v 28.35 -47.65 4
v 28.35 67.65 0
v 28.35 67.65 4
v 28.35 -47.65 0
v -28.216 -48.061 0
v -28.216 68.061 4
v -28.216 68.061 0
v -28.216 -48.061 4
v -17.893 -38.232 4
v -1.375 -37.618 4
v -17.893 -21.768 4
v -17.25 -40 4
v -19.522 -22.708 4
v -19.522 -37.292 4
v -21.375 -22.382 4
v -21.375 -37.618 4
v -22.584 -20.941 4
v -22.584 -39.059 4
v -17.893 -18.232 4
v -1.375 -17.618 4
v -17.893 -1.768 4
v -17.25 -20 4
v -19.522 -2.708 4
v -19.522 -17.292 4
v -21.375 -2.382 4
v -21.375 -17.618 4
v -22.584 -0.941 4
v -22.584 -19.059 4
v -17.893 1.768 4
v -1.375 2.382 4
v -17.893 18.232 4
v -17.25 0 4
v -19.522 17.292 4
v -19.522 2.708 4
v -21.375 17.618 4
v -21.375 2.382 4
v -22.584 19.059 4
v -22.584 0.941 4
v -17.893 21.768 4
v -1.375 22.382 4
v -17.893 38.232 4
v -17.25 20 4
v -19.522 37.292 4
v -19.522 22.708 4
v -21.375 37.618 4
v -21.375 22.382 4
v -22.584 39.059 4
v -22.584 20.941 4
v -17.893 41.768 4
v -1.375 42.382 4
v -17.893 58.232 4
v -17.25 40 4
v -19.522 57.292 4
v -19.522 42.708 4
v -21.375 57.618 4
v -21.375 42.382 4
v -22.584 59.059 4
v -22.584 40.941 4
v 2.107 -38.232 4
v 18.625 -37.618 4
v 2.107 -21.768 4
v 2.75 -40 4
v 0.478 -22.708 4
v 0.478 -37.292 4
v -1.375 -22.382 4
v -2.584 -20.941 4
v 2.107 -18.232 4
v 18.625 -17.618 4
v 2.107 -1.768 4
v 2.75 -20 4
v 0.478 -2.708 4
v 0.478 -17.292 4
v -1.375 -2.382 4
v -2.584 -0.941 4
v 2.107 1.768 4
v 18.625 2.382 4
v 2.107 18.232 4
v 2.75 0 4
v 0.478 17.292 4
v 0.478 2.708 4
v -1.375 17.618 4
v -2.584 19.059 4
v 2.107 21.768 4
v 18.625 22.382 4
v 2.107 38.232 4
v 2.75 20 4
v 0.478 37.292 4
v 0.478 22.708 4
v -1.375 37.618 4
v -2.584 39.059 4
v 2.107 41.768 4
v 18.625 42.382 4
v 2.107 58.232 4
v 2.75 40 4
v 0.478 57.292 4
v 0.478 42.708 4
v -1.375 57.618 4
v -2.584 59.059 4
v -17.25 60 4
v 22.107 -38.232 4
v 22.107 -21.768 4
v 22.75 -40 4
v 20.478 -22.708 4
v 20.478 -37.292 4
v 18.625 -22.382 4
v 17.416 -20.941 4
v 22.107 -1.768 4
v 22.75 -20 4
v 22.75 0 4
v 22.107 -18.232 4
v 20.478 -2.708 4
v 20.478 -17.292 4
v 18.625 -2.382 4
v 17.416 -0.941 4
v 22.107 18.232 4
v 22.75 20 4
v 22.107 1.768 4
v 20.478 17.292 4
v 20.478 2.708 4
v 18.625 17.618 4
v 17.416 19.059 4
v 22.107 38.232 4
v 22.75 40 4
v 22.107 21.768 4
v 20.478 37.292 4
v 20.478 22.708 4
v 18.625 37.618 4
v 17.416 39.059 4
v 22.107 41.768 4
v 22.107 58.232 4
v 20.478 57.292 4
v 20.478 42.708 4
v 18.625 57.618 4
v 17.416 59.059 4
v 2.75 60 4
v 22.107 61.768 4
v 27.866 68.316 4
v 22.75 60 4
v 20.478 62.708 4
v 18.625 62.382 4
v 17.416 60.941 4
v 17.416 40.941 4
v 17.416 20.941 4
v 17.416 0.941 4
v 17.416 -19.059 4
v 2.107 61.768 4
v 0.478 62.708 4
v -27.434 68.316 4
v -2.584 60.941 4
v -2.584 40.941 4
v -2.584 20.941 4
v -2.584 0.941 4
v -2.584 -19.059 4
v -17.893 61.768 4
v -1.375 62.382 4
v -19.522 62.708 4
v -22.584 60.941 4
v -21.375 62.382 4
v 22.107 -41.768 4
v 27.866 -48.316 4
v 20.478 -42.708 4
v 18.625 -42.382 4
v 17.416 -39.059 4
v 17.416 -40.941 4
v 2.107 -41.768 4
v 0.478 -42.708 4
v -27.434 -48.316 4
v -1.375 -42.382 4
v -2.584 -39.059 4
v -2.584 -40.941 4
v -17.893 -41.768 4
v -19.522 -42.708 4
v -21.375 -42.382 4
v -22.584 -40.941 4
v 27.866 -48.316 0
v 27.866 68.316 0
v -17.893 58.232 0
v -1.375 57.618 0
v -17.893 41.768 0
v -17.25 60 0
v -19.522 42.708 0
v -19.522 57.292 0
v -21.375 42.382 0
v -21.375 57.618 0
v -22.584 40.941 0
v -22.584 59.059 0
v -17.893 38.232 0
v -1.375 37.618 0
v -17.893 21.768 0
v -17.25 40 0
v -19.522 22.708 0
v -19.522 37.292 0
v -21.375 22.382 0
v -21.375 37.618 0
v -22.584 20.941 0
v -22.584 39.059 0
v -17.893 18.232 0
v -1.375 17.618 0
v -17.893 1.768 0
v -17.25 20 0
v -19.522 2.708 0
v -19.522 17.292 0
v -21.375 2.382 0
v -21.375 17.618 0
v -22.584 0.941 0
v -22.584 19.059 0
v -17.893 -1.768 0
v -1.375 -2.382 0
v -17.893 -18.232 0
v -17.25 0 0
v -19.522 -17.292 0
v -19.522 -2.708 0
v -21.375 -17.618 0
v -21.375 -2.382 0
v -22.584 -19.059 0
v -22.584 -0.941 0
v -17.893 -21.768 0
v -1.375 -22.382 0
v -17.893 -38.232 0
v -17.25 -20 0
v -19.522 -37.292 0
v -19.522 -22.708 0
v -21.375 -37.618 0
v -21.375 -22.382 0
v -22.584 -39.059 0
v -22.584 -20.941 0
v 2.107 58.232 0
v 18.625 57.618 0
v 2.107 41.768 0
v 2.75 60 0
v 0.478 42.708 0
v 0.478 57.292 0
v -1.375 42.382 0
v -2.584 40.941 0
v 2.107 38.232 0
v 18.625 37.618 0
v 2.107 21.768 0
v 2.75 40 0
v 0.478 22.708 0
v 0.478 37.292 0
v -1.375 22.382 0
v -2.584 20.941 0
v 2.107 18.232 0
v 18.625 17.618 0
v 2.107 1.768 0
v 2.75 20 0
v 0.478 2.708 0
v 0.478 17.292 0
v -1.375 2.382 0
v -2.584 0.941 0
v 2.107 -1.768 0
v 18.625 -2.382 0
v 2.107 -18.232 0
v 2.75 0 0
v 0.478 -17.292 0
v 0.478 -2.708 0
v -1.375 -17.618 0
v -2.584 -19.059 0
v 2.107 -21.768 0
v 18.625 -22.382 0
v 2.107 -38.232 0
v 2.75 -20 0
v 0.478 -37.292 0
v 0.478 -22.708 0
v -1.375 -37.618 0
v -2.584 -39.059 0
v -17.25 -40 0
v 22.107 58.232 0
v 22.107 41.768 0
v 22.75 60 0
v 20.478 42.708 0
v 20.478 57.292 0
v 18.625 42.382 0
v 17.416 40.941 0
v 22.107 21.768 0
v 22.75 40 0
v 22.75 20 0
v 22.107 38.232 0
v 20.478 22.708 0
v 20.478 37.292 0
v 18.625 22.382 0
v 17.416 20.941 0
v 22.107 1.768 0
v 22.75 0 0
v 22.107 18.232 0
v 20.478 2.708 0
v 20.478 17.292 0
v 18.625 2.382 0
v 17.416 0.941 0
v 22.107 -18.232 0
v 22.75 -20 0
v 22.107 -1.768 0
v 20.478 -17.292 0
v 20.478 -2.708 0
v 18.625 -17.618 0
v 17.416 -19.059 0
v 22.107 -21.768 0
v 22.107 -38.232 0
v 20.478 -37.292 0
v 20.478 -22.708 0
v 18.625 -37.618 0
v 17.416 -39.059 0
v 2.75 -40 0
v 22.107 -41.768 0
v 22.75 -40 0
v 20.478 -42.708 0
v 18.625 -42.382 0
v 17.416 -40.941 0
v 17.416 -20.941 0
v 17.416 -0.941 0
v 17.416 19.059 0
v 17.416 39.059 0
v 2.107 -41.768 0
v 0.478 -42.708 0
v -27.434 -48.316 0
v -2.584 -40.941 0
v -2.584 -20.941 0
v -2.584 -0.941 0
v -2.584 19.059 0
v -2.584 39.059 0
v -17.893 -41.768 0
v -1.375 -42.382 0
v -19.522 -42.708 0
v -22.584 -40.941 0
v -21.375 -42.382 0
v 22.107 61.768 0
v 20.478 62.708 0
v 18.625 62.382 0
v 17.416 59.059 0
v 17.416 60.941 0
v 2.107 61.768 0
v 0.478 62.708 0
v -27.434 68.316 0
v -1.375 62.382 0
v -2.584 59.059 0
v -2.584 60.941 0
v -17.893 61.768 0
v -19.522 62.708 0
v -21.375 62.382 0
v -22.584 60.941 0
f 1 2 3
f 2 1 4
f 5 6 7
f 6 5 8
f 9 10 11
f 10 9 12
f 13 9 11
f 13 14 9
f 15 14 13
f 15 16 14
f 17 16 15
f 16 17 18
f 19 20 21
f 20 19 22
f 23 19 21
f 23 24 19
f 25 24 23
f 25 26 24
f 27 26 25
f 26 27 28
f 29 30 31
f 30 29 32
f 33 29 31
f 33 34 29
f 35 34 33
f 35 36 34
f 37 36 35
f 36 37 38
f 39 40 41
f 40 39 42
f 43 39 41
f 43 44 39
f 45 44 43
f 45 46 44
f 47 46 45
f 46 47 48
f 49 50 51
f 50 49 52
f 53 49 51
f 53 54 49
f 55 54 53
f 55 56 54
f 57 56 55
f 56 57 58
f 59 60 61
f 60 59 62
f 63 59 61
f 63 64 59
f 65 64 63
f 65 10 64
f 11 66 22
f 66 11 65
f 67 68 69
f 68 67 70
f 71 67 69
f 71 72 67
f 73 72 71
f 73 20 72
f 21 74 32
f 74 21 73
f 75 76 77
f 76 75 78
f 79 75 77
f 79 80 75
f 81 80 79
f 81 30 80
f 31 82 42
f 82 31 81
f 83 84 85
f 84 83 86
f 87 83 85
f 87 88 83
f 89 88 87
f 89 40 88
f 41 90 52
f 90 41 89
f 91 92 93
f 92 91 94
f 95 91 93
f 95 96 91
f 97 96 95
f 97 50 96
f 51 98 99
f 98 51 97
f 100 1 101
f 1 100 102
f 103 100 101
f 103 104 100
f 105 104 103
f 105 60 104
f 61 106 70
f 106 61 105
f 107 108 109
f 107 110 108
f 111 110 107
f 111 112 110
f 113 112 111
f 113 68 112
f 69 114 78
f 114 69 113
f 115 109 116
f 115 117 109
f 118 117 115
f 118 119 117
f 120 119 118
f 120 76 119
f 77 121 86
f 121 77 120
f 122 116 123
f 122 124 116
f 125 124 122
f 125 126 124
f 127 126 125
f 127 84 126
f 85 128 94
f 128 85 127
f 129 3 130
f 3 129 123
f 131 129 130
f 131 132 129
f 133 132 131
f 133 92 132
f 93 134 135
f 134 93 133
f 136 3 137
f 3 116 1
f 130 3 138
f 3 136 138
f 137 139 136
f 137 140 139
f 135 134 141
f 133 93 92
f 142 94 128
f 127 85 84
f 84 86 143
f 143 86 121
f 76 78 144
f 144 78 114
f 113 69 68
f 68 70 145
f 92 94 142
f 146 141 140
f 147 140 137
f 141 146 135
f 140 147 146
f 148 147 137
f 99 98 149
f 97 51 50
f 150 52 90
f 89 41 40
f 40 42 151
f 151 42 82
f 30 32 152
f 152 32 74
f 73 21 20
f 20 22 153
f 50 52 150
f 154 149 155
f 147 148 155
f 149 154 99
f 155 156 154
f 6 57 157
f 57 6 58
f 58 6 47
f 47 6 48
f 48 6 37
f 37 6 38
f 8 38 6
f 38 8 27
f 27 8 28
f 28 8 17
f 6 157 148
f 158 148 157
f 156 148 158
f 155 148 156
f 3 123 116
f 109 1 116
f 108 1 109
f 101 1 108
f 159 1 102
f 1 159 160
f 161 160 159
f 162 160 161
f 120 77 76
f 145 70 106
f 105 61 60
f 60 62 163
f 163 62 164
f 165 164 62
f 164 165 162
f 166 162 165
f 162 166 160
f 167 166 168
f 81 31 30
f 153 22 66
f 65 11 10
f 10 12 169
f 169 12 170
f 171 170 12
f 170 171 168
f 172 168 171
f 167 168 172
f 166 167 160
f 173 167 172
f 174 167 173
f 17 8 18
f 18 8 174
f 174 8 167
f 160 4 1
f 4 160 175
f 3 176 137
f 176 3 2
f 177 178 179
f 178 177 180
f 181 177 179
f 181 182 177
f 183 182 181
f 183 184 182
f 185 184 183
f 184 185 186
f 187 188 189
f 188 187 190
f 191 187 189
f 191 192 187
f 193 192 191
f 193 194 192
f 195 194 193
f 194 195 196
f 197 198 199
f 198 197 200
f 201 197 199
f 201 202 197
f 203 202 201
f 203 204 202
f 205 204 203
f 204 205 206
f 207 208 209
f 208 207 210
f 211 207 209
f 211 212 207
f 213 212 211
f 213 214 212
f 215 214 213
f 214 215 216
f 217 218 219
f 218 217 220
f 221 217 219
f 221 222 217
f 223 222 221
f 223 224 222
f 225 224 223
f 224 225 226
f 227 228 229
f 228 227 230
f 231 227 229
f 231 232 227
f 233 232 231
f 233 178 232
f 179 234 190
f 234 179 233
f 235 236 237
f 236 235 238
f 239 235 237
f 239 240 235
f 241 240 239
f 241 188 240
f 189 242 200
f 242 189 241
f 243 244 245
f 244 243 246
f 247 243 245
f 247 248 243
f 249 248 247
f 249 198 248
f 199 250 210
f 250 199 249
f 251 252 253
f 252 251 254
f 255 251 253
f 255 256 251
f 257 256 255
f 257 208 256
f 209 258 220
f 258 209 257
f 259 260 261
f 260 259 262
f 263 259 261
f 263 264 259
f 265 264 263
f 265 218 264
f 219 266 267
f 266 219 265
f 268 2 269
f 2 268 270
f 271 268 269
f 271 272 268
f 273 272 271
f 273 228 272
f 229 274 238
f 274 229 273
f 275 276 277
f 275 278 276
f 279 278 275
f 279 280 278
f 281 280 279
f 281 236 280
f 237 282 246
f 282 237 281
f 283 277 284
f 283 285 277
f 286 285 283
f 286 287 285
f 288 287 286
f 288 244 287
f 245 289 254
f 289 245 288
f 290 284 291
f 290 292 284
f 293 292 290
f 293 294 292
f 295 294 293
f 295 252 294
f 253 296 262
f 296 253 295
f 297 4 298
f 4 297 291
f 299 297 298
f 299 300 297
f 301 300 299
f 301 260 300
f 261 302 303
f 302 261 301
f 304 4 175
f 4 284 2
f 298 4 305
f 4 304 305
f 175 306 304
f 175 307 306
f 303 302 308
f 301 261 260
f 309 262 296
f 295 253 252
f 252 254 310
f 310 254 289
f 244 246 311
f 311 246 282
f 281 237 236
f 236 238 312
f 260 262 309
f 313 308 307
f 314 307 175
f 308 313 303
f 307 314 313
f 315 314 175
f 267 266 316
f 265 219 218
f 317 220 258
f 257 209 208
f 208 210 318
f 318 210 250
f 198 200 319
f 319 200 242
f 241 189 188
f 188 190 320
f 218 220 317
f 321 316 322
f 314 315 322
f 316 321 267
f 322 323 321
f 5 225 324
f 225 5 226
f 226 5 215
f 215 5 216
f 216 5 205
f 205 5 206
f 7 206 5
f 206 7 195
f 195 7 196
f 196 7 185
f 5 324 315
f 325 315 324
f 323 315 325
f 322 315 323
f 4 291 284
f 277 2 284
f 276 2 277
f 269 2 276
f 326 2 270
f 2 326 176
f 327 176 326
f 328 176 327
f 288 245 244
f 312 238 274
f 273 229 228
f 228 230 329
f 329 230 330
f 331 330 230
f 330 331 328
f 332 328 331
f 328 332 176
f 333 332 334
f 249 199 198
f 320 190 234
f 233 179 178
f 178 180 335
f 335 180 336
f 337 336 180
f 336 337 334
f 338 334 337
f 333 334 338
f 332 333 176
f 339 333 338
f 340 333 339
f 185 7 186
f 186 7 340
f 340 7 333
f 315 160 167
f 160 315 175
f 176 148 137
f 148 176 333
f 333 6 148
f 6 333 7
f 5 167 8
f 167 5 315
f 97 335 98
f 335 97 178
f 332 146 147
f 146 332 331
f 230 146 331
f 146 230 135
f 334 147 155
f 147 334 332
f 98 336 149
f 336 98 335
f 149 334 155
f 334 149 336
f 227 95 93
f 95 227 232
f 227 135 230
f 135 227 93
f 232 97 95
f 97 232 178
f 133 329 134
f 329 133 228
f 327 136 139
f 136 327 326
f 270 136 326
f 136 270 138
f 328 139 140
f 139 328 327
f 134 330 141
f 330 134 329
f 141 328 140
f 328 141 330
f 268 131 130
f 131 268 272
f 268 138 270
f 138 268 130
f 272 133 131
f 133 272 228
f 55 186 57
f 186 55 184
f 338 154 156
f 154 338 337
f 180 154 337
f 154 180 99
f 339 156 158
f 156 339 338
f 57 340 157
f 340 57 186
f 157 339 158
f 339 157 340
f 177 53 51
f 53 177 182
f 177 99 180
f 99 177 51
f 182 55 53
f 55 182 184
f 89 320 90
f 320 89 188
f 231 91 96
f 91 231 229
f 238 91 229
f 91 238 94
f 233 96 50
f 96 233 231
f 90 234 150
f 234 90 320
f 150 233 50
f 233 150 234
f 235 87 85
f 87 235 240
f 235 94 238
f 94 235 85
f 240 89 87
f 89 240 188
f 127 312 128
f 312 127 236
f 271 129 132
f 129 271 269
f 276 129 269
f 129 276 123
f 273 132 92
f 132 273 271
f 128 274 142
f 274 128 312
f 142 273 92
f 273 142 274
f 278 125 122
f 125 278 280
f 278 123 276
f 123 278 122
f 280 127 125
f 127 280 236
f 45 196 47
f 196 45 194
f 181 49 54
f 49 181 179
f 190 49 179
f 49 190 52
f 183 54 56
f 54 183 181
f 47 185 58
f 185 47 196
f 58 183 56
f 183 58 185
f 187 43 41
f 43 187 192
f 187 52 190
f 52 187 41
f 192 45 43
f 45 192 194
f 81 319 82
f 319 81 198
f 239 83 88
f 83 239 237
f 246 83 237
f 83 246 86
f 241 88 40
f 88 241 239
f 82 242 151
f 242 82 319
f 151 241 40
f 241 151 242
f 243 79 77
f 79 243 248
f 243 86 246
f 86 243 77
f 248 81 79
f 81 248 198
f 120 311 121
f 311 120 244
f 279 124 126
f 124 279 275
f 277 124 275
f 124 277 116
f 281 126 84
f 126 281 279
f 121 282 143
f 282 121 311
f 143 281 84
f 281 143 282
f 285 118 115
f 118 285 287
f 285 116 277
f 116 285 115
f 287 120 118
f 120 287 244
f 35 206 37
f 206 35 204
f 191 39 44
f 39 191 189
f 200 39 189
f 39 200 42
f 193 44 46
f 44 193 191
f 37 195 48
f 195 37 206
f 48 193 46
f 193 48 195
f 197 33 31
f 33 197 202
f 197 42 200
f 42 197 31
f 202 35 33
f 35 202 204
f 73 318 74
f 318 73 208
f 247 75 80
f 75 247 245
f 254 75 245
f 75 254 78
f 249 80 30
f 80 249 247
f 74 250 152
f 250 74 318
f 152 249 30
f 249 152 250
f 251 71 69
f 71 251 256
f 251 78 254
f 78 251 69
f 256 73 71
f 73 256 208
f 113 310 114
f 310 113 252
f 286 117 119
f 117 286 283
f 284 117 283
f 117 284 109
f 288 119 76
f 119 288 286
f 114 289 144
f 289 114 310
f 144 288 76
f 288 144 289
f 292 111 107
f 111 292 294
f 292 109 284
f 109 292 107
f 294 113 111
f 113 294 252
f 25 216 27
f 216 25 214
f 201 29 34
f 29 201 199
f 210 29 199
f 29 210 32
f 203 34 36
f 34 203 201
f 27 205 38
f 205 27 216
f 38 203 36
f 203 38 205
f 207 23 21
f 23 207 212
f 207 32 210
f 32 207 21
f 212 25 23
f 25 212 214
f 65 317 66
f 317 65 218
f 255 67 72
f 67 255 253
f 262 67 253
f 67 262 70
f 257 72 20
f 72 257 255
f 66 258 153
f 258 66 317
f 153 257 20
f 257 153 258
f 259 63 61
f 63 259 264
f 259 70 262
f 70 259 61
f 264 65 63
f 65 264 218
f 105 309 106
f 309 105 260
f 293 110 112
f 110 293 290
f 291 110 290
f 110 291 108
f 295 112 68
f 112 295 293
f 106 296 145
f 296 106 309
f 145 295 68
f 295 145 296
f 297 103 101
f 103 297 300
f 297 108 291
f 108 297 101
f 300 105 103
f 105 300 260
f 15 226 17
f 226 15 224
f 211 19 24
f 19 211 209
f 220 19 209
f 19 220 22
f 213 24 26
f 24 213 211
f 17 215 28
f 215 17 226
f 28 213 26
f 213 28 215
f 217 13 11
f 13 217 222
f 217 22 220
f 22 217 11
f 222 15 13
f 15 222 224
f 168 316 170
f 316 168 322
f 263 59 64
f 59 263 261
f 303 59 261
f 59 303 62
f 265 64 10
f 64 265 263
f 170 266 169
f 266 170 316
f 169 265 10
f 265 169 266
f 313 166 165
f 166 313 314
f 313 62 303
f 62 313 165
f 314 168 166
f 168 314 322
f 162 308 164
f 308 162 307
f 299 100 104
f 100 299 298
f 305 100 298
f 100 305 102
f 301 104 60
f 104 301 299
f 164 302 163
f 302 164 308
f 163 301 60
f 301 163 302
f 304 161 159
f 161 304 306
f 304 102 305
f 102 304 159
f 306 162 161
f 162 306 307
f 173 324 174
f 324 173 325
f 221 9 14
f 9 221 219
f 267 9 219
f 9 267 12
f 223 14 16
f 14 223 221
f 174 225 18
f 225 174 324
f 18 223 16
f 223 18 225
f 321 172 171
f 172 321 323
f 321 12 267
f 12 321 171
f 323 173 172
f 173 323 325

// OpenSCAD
// rob@openpart.co.uk 20140202-22:24
// 18 hole joining plate for 60mm NOMINAL extrusion
// V-Slot 6020 & others

module roundedRect(size, radius)
{
	x = size[0];
	y = size[1];
	z = size[2];
	linear_extrude(height=z)
	hull()
	{
		// place 4 circles in the corners, with the given radius
		translate([(-x/2)+(radius/2), (-y/2)+(radius/2), 0])
		circle(r=radius);
		translate([(x/2)-(radius/2), (-y/2)+(radius/2), 0])
		circle(r=radius);
		translate([(-x/2)+(radius/2), (y/2)-(radius/2), 0])
		circle(r=radius);
		translate([(x/2)-(radius/2), (y/2)-(radius/2), 0])
		circle(r=radius);
	}
}

hole = 5.5 / 2;
plate_width = 116;
plate_length = 56;
plate_thickness = 4;
extend_past_thickness = 2;
corner_radius = 0.7;

difference() {
	translate([0, 10, 0])
		roundedRect ([plate_length, plate_width, plate_thickness], corner_radius);
	
	// Holes
	translate([0,60,-1])
		cylinder(h = (extend_past_thickness+plate_thickness+2), r = hole);
	translate([20,60,-1])
		cylinder(h = (extend_past_thickness+plate_thickness+2), r = hole);
	translate([-20,60,-1])
		cylinder(h = (extend_past_thickness+plate_thickness+2), r = hole);

	translate([0,40,-1])
		cylinder(h = (extend_past_thickness+plate_thickness+2), r = hole);
	translate([20,40,-1])
		cylinder(h = (extend_past_thickness+plate_thickness+2), r = hole);
	translate([-20,40,-1])
		cylinder(h = (extend_past_thickness+plate_thickness+2), r = hole);

	translate([0,20,-1])
		cylinder(h = (extend_past_thickness+plate_thickness+2), r = hole);
	translate([20,20,-1])
		cylinder(h = (extend_past_thickness+plate_thickness+2), r = hole);
	translate([-20,20,-1])
		cylinder(h = (extend_past_thickness+plate_thickness+2), r = hole);

	translate([0,0,-1])
		cylinder(h = (extend_past_thickness+plate_thickness+2), r = hole);
	translate([20,0,-1])
		cylinder(h = (extend_past_thickness+plate_thickness+2), r = hole);
	translate([-20,0,-1])
		cylinder(h = (extend_past_thickness+plate_thickness+2), r = hole);

	translate([0,-20,-1])
		cylinder(h = (extend_past_thickness+plate_thickness+2), r = hole);
	translate([20,-20,-1])
		cylinder(h = (extend_past_thickness+plate_thickness+2), r = hole);
	translate([-20,-20,-1])
		cylinder(h = (extend_past_thickness+plate_thickness+2), r = hole);

	translate([0,-40,-1])
		cylinder(h = (extend_past_thickness+plate_thickness+2), r = hole);
	translate([20,-40,-1])
		cylinder(h = (extend_past_thickness+plate_thickness+2), r = hole);
	translate([-20,-40,-1])
		cylinder(h = (extend_past_thickness+plate_thickness+2), r = hole);
}
